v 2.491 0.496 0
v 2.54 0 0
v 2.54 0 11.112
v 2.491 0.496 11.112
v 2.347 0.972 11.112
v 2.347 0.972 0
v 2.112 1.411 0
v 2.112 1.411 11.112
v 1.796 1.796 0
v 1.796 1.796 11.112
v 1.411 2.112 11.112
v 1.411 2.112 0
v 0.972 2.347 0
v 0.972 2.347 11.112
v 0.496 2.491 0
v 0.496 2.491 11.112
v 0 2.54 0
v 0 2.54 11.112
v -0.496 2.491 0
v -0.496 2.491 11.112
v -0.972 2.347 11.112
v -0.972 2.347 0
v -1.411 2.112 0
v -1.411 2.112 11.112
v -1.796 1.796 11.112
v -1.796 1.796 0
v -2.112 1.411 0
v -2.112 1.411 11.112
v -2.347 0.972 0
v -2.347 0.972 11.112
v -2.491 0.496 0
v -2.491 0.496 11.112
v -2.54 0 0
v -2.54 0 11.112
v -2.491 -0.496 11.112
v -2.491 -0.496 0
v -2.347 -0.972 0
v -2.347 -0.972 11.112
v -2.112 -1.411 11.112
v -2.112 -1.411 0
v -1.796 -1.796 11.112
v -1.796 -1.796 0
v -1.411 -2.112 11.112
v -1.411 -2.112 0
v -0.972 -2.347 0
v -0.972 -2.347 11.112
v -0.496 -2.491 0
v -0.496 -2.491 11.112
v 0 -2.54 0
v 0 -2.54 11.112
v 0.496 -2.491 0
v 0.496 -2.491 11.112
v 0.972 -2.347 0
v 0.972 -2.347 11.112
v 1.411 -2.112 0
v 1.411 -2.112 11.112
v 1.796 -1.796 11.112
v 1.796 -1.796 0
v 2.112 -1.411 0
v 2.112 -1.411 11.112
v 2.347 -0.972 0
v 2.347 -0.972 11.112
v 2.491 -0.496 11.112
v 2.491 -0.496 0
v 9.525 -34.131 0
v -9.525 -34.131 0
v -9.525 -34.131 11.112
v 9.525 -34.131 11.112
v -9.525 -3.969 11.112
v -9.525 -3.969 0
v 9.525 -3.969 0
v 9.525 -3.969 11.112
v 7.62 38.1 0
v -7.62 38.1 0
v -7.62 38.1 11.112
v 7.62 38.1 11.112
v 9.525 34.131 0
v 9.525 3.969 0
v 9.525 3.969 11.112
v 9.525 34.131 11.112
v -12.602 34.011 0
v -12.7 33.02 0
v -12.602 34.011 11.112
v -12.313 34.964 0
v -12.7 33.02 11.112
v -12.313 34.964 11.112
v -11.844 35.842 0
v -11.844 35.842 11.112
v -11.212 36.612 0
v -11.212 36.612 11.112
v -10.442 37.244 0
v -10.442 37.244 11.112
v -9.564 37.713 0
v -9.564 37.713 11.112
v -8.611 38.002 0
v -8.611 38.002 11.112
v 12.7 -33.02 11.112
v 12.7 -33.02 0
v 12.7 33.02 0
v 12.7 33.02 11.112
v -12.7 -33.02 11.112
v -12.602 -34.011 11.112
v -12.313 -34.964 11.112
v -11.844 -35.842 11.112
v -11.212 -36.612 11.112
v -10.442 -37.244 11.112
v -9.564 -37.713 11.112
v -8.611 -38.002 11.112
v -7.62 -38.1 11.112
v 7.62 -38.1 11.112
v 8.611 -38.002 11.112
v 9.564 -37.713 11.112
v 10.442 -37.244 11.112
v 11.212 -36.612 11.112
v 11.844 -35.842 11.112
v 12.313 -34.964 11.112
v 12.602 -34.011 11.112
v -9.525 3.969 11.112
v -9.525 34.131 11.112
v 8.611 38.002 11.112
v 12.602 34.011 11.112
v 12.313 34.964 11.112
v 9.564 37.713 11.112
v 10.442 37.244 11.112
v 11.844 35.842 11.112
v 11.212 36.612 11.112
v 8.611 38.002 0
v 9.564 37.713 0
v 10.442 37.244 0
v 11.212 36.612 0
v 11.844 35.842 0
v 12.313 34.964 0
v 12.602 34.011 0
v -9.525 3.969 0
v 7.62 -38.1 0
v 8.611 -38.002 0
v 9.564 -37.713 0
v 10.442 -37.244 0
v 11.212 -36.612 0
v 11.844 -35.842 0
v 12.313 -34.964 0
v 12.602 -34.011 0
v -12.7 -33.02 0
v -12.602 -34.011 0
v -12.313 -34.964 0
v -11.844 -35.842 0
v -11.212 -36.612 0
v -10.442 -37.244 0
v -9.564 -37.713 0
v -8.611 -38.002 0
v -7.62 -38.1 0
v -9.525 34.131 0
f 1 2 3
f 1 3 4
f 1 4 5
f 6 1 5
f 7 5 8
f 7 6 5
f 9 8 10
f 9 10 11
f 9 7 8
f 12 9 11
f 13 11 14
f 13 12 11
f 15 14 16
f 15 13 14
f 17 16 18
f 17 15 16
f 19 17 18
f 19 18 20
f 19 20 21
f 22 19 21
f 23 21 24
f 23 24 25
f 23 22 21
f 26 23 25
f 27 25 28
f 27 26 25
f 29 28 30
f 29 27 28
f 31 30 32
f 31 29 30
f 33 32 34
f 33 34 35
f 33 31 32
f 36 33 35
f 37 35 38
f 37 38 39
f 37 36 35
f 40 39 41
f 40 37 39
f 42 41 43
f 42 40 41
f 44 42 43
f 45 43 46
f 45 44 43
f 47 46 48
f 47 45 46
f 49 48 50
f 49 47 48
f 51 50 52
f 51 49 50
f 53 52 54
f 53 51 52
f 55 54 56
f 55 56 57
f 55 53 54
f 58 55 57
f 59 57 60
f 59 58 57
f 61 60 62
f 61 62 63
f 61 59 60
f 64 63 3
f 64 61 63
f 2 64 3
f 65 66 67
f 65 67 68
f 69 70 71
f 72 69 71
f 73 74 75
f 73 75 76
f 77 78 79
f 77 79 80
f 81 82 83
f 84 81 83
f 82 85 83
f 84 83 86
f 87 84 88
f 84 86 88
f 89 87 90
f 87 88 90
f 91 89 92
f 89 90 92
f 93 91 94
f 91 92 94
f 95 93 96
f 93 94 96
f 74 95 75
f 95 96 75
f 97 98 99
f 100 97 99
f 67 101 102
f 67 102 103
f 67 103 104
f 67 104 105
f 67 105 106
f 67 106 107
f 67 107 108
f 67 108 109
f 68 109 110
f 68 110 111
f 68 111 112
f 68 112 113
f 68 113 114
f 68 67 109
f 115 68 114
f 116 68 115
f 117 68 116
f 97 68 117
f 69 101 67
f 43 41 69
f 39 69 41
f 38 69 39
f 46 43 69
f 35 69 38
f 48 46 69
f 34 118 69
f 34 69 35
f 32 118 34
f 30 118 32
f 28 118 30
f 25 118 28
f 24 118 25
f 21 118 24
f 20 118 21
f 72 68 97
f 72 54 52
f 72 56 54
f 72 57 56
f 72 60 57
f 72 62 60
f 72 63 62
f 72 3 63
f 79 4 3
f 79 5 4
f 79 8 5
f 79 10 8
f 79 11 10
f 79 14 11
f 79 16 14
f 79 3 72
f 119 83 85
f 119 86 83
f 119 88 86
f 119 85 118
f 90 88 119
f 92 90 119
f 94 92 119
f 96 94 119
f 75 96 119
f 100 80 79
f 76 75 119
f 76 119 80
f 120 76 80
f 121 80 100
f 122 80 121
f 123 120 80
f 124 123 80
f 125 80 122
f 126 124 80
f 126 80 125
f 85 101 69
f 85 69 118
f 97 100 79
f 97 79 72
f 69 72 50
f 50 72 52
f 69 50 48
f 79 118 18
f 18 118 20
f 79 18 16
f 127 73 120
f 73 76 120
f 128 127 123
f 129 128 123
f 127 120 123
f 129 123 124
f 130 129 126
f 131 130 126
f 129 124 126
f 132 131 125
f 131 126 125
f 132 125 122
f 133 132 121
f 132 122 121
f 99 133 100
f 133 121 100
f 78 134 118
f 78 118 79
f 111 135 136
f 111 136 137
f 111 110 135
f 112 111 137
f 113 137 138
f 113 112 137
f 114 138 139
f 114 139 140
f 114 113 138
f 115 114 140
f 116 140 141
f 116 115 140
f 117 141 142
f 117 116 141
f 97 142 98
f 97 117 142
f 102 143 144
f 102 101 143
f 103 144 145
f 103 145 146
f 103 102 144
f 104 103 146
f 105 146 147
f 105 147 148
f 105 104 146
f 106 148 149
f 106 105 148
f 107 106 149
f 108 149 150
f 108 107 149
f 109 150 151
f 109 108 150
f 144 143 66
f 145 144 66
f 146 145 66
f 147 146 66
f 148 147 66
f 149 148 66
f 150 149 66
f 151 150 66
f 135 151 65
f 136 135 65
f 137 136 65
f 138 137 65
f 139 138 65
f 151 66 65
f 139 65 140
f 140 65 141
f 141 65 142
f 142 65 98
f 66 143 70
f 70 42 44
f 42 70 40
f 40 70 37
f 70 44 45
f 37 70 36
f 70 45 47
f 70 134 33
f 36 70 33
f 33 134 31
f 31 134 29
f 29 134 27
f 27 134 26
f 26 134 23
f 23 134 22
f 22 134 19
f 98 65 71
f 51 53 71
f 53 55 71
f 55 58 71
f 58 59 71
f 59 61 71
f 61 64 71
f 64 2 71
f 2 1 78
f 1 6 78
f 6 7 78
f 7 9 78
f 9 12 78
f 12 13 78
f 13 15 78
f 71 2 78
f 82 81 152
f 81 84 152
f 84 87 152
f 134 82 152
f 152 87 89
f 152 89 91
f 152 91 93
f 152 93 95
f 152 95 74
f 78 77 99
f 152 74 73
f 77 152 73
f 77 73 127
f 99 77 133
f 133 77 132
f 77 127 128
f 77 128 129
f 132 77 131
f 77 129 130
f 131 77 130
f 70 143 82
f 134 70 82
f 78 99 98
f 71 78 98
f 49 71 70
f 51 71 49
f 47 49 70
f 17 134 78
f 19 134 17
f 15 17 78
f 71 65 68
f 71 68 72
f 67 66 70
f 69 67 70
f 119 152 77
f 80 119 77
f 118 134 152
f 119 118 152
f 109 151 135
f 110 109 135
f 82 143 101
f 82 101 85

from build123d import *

# Parameters (mm, degrees)
F0_W     = 25.4
F0_H     = 76.2
F0_W_2   = 19.05
F0_H_2   = 30.1625
F0_R     = 2.54
F1_DEPTH = 11.1125
F2_R     = 5.08


with BuildPart() as f1:
    # F0 (on Top) → F1 (new body)
    with BuildSketch(Plane.XY):
        Rectangle(F0_W, F0_H)
        with Locations((0, -19.05)):
            Rectangle(F0_W_2, F0_H_2, mode=Mode.SUBTRACT)
        Circle(F0_R, mode=Mode.SUBTRACT)
        with Locations((0, 19.05)):
            Rectangle(F0_W_2, F0_H_2, mode=Mode.SUBTRACT)
    extrude(amount=F1_DEPTH)

    # F2
    f2_edges = [f1.edges().sort_by_distance(p)[0] for p in [
        (12.7, -38.1, 5.55625),
        (-12.7, -38.1, 5.55625),
        (12.7, 38.1, 5.55625),
        (-12.7, 38.1, 5.55625),
    ]]
    fillet(f2_edges, radius=F2_R)


solid = f1.part
